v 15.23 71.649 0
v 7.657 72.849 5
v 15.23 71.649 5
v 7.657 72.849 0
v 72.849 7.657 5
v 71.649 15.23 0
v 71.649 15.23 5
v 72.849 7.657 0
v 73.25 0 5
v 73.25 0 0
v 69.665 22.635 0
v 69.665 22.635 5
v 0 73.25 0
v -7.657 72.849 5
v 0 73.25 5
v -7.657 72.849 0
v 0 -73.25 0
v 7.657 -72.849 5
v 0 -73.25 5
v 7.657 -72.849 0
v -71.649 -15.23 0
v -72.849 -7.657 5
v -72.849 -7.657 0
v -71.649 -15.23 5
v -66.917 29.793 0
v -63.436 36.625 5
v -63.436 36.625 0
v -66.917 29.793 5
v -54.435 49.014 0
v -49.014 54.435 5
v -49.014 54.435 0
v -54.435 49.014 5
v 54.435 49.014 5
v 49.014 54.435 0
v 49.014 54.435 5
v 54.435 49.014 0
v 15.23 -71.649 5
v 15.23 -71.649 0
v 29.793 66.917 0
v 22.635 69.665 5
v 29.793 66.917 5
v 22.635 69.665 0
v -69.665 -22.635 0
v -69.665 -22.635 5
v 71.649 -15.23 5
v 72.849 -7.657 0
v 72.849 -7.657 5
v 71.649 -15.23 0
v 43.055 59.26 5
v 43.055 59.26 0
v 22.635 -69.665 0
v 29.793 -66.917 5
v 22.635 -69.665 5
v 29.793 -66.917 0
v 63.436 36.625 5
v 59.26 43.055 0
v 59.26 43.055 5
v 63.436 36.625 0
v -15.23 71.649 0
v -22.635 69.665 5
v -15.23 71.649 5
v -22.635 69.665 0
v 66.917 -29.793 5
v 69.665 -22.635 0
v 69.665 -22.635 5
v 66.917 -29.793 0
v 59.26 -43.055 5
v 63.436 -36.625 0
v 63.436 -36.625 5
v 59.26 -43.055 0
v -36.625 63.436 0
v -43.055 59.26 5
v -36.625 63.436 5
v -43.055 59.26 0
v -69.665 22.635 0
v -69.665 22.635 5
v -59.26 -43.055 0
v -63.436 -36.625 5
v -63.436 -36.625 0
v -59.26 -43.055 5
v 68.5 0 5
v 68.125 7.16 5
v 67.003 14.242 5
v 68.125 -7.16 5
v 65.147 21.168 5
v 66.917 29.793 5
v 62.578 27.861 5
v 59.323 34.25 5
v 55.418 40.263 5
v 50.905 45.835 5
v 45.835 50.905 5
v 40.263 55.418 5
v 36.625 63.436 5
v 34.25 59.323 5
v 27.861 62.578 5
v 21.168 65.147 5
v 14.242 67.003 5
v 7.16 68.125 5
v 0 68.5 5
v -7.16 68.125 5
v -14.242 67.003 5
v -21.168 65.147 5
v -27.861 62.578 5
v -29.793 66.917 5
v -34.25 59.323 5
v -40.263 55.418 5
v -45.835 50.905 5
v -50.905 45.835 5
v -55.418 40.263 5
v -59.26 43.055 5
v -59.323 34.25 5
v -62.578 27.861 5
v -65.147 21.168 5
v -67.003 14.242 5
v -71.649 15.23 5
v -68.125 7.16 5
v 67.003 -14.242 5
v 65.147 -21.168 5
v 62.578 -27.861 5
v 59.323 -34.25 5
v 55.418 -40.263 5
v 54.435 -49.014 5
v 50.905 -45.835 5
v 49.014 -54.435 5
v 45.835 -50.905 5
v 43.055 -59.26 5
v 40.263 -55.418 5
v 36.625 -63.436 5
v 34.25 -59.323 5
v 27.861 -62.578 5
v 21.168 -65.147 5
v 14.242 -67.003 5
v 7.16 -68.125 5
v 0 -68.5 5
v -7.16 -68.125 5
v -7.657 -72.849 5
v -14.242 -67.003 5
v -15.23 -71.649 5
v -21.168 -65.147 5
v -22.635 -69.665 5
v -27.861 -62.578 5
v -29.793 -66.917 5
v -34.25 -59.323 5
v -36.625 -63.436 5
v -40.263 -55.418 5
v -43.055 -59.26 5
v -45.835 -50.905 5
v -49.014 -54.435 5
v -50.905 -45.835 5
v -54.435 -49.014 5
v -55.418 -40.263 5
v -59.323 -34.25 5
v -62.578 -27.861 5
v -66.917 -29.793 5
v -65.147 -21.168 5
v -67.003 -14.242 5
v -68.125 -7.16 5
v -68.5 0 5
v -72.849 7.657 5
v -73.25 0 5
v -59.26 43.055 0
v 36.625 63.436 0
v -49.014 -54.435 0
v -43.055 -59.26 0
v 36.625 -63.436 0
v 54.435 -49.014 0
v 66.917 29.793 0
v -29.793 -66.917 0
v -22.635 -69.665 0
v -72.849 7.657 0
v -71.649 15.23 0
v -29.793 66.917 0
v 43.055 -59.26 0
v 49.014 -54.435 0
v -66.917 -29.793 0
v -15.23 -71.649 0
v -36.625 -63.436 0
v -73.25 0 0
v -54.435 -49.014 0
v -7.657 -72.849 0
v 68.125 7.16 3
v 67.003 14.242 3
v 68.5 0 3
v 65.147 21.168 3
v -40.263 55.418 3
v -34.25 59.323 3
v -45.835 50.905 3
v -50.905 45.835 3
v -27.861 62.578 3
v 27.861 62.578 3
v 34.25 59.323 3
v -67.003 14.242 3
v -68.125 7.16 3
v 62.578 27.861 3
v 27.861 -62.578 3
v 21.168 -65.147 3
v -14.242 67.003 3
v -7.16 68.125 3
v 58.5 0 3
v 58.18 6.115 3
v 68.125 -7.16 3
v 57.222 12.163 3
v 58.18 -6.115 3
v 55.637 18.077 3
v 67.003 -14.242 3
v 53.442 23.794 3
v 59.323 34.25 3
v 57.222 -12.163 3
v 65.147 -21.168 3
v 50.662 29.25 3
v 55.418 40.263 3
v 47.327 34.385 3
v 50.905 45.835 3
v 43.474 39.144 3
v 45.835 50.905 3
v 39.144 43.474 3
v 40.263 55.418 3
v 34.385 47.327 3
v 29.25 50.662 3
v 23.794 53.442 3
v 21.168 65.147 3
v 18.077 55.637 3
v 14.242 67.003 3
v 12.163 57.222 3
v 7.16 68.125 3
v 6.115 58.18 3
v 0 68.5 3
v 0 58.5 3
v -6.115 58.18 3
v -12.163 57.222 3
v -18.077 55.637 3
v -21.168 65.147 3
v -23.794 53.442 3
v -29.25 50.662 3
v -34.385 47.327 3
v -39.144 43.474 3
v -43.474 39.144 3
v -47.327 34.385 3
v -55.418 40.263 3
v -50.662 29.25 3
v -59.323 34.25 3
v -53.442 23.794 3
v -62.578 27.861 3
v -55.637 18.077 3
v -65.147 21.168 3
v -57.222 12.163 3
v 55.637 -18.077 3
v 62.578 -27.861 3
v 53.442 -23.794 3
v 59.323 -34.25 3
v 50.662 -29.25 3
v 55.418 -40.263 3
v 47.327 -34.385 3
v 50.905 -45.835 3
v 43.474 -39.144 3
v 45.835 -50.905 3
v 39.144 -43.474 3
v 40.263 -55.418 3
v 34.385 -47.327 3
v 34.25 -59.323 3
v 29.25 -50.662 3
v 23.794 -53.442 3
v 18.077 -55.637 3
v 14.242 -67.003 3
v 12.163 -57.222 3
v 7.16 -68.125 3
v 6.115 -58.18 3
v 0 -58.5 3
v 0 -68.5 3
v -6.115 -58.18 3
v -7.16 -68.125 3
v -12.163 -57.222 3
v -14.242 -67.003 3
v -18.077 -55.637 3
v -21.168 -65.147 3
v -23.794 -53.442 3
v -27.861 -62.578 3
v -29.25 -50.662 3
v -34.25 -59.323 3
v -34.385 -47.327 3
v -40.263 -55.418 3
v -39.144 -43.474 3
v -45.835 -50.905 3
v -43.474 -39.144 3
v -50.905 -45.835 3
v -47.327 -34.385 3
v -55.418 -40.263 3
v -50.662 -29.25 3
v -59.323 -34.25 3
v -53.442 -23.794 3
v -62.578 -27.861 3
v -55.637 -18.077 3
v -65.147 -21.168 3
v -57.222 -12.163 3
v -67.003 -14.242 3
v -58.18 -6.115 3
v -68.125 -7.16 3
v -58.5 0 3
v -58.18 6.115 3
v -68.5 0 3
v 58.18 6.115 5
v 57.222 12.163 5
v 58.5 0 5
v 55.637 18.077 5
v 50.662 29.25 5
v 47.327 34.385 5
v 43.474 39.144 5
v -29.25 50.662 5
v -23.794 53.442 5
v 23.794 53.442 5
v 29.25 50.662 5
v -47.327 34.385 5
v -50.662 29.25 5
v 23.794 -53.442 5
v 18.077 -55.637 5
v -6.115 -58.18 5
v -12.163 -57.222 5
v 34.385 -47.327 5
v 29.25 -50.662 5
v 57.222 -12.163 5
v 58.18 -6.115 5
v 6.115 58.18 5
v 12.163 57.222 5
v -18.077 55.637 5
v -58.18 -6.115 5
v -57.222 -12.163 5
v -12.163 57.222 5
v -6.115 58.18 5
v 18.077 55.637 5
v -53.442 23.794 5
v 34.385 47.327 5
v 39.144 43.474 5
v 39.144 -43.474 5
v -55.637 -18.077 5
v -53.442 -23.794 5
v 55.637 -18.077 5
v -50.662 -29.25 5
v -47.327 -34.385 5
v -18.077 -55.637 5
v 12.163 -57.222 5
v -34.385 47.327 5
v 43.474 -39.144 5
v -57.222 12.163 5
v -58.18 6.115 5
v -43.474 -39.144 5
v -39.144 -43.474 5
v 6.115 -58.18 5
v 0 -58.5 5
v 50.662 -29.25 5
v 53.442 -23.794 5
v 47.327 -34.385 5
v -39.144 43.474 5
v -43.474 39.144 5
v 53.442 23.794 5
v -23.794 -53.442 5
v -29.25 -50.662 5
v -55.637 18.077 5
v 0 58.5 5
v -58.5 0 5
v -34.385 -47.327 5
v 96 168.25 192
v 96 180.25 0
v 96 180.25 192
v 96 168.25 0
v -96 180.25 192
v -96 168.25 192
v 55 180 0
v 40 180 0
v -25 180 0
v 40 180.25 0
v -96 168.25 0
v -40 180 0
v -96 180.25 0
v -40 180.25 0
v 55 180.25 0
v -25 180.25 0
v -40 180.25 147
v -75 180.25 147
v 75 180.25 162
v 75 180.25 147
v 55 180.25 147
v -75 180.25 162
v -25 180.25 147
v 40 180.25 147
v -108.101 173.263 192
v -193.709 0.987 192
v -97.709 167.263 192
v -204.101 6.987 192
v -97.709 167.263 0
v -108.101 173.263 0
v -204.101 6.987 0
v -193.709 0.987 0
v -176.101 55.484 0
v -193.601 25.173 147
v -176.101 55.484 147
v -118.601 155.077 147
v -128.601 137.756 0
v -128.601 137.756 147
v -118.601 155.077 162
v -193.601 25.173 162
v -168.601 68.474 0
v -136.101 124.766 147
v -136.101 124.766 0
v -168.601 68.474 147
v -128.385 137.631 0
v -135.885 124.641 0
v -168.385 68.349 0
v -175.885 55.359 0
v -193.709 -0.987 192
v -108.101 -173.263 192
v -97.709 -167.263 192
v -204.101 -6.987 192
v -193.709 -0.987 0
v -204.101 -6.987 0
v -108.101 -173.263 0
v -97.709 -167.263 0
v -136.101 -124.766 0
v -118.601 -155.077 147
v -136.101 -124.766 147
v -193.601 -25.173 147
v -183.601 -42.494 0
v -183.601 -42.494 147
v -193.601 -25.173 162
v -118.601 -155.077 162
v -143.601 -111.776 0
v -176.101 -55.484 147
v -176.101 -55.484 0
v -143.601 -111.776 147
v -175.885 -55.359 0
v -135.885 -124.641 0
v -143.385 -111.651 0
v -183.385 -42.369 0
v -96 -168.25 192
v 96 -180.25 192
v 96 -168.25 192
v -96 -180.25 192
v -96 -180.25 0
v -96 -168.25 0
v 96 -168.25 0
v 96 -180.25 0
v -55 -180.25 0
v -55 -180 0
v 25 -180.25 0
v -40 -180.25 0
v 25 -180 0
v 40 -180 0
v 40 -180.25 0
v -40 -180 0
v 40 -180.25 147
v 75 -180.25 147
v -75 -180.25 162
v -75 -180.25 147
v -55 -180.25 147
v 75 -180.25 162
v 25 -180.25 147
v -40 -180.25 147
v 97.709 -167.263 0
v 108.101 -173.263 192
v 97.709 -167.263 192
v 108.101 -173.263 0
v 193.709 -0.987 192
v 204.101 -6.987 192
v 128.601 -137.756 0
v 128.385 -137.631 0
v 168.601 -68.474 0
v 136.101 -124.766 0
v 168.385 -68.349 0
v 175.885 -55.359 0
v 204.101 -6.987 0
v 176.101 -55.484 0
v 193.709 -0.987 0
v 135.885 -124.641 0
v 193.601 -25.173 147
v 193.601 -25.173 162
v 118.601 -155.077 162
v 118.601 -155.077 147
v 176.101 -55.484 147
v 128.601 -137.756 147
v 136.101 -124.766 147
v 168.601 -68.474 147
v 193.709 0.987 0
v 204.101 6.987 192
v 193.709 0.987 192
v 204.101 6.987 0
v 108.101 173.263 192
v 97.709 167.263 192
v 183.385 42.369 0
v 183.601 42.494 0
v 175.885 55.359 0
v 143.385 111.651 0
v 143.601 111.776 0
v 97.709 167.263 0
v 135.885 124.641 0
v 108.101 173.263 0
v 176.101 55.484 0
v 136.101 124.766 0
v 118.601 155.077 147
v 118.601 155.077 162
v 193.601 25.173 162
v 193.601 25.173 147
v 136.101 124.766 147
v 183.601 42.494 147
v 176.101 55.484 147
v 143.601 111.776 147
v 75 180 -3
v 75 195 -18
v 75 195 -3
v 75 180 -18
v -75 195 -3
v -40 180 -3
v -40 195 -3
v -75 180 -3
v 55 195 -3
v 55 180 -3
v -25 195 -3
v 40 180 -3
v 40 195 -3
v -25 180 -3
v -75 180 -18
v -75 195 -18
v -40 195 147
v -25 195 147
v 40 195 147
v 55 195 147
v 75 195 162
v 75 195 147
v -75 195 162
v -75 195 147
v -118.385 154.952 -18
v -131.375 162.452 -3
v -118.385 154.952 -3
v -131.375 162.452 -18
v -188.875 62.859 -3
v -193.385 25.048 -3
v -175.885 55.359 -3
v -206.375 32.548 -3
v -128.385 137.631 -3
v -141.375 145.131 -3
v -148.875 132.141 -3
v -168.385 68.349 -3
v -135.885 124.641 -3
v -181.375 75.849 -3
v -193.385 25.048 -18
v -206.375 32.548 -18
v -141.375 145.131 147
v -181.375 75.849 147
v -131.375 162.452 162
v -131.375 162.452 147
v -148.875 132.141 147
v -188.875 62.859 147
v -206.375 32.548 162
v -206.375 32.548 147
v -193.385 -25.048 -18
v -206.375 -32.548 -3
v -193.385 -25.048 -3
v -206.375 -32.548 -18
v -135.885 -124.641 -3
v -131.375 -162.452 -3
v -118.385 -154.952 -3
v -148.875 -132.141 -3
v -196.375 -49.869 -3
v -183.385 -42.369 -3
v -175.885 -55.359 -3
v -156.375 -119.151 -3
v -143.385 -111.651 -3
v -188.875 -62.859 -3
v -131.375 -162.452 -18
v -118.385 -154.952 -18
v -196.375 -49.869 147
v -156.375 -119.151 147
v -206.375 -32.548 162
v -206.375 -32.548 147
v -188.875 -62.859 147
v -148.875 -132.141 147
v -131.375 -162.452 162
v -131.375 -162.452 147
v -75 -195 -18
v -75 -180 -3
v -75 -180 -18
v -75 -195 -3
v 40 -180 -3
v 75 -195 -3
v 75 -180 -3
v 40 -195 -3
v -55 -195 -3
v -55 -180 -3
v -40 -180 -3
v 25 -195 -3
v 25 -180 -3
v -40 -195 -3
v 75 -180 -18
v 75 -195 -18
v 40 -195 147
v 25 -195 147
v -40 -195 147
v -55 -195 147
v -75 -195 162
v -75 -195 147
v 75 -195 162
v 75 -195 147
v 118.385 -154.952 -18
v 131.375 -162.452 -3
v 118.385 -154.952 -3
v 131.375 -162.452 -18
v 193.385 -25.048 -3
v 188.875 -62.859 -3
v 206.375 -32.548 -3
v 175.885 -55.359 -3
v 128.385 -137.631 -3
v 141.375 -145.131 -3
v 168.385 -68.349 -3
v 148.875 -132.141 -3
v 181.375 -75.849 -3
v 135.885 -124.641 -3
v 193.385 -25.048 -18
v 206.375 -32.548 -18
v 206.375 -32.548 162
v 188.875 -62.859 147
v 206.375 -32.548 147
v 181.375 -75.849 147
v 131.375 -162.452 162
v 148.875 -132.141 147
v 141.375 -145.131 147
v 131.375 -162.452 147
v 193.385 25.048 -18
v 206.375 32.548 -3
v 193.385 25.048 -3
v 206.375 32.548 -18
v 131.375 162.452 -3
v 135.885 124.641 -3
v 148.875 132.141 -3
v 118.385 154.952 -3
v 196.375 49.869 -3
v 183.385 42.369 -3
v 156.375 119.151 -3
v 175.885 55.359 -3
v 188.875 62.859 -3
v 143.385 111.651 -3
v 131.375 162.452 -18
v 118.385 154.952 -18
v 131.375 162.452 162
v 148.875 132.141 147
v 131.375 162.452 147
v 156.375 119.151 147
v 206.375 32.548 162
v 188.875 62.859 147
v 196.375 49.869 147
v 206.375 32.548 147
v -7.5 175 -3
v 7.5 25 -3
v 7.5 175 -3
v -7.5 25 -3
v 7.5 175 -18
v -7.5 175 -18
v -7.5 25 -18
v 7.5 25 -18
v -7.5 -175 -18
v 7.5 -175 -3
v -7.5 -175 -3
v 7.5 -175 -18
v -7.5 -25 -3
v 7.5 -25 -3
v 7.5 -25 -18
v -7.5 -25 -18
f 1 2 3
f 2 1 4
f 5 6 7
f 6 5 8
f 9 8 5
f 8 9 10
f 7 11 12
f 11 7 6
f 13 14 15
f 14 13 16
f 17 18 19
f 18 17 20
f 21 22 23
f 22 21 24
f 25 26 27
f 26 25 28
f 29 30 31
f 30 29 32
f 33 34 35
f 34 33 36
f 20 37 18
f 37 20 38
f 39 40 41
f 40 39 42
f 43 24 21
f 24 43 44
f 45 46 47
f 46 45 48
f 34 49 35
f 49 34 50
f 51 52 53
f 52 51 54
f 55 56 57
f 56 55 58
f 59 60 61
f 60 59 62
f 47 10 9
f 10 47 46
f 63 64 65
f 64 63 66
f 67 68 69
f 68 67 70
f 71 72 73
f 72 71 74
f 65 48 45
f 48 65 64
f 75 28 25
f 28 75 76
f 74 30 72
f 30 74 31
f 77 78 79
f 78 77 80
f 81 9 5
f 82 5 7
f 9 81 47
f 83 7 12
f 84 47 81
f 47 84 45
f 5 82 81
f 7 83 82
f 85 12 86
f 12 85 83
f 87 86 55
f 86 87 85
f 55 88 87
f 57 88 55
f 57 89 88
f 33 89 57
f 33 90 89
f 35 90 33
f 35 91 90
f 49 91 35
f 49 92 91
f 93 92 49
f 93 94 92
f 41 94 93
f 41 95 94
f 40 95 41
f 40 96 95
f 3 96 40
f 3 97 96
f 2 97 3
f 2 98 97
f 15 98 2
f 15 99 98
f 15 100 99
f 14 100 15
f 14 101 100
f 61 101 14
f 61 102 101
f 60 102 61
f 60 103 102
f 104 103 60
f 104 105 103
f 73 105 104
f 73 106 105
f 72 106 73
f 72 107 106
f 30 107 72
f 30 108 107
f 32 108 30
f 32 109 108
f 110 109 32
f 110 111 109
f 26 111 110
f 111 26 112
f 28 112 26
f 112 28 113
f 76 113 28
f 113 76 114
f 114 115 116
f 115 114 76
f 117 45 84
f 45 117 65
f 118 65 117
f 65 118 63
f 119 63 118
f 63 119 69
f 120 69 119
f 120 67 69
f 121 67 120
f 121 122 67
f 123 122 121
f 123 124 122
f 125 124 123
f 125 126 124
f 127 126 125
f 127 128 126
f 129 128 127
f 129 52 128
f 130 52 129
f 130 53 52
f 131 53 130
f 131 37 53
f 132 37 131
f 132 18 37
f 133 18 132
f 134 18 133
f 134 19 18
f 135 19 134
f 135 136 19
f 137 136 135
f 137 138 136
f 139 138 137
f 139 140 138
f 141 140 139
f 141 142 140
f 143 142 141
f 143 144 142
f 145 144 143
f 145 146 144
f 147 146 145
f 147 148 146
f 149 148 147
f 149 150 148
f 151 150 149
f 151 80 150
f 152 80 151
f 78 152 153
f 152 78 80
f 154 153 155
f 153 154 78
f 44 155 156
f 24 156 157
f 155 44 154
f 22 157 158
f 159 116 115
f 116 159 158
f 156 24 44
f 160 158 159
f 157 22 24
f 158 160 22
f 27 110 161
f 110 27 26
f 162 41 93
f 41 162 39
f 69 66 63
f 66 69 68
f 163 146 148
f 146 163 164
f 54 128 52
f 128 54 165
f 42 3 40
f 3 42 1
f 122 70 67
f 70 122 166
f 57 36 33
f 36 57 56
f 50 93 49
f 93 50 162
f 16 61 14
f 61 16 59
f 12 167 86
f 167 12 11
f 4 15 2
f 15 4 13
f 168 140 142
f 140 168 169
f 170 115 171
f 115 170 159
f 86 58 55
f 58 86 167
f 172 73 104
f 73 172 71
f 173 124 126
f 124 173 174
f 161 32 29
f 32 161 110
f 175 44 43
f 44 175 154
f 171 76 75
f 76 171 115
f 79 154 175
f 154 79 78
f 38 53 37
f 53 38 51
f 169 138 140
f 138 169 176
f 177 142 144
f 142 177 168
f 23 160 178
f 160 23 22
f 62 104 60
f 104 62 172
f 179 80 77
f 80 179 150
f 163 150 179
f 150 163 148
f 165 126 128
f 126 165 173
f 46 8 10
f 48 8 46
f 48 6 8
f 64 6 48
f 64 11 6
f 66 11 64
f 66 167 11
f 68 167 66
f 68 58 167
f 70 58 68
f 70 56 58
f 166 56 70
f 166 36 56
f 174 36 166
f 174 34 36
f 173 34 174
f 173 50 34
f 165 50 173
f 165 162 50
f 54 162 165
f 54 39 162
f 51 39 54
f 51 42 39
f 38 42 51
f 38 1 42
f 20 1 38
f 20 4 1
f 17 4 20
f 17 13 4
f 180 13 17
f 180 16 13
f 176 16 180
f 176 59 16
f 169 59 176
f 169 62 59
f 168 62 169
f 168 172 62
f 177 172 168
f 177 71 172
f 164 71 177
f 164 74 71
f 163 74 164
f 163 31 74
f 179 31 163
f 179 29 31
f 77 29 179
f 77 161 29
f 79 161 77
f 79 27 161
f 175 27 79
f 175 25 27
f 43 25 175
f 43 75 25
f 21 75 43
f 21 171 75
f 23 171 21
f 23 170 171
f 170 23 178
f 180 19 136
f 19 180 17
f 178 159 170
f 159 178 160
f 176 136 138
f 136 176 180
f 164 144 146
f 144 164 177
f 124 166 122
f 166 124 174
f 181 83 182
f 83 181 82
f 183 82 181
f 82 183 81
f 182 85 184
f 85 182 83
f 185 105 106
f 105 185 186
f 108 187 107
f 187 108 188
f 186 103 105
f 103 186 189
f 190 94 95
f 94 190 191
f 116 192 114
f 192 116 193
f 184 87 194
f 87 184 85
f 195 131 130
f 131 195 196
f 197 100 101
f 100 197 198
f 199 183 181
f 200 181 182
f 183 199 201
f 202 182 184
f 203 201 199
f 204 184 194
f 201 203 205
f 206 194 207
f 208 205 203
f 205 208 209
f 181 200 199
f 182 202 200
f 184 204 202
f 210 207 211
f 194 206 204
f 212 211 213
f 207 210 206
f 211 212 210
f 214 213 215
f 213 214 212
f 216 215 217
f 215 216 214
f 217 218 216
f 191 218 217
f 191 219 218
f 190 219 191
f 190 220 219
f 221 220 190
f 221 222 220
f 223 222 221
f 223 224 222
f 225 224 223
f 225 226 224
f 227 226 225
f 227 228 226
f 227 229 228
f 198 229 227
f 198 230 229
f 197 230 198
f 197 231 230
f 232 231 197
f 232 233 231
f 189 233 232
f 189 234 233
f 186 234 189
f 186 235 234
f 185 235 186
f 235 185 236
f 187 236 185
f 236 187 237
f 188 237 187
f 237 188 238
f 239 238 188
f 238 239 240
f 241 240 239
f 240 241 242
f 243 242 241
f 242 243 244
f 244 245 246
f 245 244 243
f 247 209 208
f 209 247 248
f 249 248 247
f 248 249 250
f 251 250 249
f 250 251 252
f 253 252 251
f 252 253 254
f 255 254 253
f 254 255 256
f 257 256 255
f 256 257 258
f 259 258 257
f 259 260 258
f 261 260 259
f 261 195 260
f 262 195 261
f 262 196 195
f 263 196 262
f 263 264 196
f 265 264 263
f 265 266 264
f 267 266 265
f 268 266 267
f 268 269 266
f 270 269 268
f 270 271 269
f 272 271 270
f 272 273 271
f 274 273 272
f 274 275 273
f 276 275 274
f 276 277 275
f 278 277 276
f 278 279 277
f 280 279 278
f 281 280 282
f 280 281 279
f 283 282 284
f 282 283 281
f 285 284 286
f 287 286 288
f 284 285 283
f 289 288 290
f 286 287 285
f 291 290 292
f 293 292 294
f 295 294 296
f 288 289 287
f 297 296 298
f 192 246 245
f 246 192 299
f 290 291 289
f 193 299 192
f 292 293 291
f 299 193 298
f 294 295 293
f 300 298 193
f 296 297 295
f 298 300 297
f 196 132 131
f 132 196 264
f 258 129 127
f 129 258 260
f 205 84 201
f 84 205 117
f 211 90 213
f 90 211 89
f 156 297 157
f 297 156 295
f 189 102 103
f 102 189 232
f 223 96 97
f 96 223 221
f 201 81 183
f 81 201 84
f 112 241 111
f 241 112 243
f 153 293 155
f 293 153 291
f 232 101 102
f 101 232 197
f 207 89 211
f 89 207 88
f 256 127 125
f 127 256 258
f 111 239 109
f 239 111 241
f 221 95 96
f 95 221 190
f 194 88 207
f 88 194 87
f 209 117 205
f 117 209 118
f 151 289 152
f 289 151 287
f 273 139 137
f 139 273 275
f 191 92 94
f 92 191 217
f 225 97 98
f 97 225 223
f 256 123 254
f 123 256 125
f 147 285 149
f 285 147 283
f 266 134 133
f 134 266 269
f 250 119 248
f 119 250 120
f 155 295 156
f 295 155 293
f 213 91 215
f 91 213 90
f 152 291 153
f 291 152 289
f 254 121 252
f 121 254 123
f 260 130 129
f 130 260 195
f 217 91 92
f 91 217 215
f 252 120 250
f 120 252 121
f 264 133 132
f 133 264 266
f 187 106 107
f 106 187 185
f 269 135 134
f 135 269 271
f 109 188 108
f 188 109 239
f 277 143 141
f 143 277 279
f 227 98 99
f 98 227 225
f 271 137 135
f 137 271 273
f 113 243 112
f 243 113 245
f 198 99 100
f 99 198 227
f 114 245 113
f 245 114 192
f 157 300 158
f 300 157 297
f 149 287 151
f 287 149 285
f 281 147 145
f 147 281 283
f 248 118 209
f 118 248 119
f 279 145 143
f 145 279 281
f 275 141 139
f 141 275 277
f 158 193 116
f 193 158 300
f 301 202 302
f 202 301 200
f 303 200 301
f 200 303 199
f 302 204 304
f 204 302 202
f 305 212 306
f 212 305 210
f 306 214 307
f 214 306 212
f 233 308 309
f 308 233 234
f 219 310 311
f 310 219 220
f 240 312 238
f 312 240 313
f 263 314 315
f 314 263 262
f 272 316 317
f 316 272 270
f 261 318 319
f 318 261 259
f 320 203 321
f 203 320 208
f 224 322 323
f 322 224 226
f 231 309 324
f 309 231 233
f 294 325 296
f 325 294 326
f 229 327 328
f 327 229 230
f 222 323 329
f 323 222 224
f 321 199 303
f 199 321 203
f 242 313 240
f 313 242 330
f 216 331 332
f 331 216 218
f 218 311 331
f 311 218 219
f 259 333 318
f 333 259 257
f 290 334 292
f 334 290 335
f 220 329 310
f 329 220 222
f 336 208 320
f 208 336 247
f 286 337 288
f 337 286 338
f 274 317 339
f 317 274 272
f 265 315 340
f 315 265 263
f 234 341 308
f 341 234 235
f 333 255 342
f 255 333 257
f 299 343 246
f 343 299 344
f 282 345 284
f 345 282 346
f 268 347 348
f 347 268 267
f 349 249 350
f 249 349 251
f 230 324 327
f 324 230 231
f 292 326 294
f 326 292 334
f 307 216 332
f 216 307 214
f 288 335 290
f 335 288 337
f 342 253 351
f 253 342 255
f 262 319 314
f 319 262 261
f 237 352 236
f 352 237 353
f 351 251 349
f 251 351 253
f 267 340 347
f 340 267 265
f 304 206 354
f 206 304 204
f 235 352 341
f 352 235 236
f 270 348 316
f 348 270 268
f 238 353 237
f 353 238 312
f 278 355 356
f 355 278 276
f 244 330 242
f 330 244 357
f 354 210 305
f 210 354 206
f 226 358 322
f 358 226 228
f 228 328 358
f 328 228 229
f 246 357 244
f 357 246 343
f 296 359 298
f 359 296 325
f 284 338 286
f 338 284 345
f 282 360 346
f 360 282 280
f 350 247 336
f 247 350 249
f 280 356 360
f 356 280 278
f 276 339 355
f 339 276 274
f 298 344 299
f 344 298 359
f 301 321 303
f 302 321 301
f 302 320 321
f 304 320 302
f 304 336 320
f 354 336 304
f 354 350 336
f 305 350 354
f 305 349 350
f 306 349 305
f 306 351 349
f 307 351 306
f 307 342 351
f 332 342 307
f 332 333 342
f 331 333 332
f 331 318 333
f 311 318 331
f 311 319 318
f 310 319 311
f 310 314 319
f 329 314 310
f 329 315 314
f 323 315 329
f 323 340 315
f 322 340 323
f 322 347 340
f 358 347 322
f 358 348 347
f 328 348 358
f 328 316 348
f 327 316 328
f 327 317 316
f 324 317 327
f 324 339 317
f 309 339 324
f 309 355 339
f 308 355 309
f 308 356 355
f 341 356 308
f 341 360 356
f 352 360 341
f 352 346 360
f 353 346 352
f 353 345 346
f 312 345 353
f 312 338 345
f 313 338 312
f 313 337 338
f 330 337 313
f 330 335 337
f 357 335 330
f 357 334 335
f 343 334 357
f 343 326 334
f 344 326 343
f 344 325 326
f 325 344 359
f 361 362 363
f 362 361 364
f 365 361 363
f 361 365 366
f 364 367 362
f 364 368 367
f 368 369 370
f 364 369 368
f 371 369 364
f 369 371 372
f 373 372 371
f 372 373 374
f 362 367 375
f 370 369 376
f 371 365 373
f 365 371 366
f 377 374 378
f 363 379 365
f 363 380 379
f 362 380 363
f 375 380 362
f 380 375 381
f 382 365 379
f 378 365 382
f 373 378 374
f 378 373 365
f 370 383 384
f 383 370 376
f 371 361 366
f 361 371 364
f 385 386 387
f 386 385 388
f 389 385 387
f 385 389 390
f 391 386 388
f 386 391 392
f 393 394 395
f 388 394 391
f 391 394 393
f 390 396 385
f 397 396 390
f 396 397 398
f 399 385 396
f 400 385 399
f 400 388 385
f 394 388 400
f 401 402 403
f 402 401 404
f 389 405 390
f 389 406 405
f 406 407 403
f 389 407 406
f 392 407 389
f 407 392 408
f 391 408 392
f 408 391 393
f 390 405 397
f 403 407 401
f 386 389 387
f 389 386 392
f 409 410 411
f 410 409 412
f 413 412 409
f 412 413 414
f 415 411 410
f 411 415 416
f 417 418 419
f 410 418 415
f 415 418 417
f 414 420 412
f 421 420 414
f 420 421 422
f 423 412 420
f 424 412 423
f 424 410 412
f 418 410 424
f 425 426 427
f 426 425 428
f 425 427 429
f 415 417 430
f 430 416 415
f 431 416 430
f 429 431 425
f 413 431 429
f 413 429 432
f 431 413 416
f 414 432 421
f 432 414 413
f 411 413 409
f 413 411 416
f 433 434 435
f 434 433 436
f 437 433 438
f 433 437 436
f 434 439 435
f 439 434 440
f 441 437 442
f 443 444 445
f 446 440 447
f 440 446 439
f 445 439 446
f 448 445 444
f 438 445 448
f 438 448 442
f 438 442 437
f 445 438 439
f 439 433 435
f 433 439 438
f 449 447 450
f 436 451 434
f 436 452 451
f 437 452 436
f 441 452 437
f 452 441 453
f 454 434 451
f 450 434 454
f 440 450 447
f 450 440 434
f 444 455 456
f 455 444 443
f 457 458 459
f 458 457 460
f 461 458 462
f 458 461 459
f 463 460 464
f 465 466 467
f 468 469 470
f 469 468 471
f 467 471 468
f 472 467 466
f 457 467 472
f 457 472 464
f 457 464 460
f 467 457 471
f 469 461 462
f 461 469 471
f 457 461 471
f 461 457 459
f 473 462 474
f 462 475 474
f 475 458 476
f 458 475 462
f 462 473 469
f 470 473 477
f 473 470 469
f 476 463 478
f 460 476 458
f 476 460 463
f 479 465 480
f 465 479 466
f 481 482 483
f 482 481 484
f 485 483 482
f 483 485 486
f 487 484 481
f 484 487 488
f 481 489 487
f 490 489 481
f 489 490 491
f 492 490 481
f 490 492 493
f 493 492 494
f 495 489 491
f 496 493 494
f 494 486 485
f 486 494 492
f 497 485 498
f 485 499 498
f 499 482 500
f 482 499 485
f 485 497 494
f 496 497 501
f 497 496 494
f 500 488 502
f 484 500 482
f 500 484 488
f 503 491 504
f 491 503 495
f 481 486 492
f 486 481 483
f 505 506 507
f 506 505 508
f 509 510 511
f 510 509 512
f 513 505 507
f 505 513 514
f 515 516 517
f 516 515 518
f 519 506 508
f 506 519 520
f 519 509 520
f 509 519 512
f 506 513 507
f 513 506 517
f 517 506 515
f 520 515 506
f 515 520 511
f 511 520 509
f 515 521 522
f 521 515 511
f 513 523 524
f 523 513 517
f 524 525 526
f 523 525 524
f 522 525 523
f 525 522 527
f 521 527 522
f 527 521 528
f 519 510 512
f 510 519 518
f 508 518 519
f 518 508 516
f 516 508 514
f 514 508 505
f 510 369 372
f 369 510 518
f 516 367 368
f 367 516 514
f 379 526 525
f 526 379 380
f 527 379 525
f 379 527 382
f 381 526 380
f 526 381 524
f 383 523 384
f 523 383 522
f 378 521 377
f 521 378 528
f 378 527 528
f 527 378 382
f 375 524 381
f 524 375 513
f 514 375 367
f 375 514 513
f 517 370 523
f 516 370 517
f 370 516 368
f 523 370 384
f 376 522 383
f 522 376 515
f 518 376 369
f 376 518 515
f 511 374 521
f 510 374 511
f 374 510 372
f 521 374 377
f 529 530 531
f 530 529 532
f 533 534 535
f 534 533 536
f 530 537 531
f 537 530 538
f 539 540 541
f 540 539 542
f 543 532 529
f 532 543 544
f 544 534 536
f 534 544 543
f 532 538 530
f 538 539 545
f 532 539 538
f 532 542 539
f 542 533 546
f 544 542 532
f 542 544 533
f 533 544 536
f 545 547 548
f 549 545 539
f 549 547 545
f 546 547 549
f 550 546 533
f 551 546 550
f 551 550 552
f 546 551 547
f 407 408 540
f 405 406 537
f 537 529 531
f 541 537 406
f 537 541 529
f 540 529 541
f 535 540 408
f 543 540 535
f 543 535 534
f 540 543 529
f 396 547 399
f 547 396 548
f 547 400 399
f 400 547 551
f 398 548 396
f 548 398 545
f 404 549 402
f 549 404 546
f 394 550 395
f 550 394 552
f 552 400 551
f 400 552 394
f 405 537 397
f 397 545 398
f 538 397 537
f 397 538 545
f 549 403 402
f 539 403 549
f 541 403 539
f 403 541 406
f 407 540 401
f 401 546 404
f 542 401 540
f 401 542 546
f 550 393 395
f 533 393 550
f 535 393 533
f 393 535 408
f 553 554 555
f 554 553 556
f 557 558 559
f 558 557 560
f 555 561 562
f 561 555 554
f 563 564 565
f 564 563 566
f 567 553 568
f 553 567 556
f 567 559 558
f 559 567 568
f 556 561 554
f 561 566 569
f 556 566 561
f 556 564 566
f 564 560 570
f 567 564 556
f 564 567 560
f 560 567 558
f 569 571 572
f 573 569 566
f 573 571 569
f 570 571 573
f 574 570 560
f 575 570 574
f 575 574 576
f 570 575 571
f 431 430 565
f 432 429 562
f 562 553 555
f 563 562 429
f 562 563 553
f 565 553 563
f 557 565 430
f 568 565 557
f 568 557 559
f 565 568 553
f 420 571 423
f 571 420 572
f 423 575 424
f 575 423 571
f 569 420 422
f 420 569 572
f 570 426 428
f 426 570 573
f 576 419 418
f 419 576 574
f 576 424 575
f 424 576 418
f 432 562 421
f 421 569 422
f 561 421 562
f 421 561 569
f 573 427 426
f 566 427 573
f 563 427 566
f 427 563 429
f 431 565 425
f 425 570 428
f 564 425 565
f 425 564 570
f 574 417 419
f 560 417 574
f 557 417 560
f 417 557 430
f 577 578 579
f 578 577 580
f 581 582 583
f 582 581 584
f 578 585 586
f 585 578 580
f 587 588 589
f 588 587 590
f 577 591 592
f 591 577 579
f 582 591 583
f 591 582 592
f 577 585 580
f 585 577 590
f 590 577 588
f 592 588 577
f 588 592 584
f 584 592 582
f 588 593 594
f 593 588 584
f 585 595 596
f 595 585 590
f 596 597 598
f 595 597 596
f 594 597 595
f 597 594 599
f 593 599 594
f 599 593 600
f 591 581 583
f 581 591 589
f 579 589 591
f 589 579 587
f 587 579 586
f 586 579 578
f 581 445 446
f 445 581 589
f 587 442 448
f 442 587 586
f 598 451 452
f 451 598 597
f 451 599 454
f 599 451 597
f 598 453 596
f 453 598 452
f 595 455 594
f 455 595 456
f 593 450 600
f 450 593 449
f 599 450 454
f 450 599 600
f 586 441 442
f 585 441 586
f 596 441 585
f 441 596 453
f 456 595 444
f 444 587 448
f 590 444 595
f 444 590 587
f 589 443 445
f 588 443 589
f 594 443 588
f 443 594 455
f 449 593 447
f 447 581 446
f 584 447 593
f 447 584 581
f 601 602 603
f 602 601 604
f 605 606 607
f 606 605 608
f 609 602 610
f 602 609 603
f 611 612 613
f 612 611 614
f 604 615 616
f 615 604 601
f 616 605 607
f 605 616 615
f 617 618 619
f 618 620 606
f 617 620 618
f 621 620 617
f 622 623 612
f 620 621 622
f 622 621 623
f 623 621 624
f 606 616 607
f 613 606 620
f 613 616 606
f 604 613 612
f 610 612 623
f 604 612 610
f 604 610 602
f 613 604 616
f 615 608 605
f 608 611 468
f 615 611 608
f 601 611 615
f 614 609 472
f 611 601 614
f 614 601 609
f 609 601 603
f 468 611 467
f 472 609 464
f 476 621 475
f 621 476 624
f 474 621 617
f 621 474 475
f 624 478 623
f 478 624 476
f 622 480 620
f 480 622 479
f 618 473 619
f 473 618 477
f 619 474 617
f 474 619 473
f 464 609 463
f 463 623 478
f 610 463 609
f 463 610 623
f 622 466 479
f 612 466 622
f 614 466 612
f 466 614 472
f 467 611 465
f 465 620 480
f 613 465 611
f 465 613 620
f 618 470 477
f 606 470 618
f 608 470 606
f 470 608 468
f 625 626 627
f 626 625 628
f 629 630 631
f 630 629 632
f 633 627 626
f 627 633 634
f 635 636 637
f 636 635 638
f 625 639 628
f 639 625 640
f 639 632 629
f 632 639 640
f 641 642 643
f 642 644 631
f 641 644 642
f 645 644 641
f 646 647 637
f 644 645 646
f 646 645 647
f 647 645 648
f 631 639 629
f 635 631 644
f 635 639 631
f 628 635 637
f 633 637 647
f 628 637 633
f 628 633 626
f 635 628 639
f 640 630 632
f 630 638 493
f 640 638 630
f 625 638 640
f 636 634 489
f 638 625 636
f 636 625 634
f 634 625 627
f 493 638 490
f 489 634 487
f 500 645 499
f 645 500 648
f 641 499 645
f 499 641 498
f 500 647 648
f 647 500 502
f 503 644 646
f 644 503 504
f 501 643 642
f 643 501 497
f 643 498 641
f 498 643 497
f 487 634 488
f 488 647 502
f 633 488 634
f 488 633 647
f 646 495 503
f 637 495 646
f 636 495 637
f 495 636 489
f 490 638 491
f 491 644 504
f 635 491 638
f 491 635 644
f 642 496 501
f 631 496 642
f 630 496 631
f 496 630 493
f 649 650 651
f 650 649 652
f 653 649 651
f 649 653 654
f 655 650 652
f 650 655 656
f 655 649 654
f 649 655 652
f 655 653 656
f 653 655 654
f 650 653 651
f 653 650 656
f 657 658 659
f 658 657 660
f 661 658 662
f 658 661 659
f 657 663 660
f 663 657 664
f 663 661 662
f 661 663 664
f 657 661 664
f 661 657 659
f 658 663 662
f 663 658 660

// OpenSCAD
//Buridan paradigm///
//fly plaform v0.1//
//CC BY SA 4.0 //
// first design by Andre Maia Chagas 17/01/2025//
//units in mm //


platD = 117;
platH = 5;
platEdgeD = 146.5;//platD+8;
tolerance = 0.1;
$fn=60;
matrixL = 192;//127.7;
matrixH = 192;//127.7;

module platform(){

//make platform
difference(){
cylinder(d=platEdgeD,h=platH,$fn=60);
translate([0,0,3]){
cylinder(d=platD+20,h=2.5);
}//end translate
}//end difference
cylinder(d=platD,h=platH);
//%cylinder(d=platEdgeD+22.8,h=platH,$fn=6);

}//end module

module screens(){
for(i=[0:60:301]){
rotate([0,0,i]){
translate([-matrixL/2,platEdgeD/2+95,0]){
cube([matrixL,12,matrixH]);
        }
    }
/*
*/
}
}//end module

module sticks(){
  for(i=[0:60:301]){  
     //measuring "sticks"
    rotate([0,0,i+90])
translate([170/2,0,10]){
cube([170,10,2],center=true);
}//end translate
  
    }//end for
}//end module

module beams(r=180){
    for(i=[0:60:301]){  
rotate([0,0,i]){
translate([-150/2,r,0]){
color("green")cube([150,15,15]);
}
translate([-150/2,r,165]){
color("green")cube([150,15,15]);
}
rotate([0,90,0]){
translate([-150-15,r,80/2]){
color("blue")cube([150,15,15]);
}
}
rotate([0,90,0]){
translate([-150-15,r,-80/2]){
color("blue")cube([150,15,15]);
}
}
}

        }//end for

        for(i=[0:180:301]){  
rotate([0,0,i+90])
translate([25,-15/2,-0]){
cube([150,15,15]);          
}//end translate

}

    }//end module

module connectors(){
translate([-179/2,155,0]){  
  translate([-40/2,40/2,0])   
color("red")cube([50,20,20]);
rotate([0,0,60]){
translate([-40/2,40/2,0]){
color("red")cube([50,20,20]);
}//end translate

}//end rotate

}//end translate
}//end module


//sticks();
platform();
screens();

translate([0,0,-18]){
beams();
//connectors();
}

//possible join?
//difference(){
//    translate([0,-2.5,-2.5]){rotate([0,0,-30])connectors();}
//    rotate([0,0,-30])beams();}
